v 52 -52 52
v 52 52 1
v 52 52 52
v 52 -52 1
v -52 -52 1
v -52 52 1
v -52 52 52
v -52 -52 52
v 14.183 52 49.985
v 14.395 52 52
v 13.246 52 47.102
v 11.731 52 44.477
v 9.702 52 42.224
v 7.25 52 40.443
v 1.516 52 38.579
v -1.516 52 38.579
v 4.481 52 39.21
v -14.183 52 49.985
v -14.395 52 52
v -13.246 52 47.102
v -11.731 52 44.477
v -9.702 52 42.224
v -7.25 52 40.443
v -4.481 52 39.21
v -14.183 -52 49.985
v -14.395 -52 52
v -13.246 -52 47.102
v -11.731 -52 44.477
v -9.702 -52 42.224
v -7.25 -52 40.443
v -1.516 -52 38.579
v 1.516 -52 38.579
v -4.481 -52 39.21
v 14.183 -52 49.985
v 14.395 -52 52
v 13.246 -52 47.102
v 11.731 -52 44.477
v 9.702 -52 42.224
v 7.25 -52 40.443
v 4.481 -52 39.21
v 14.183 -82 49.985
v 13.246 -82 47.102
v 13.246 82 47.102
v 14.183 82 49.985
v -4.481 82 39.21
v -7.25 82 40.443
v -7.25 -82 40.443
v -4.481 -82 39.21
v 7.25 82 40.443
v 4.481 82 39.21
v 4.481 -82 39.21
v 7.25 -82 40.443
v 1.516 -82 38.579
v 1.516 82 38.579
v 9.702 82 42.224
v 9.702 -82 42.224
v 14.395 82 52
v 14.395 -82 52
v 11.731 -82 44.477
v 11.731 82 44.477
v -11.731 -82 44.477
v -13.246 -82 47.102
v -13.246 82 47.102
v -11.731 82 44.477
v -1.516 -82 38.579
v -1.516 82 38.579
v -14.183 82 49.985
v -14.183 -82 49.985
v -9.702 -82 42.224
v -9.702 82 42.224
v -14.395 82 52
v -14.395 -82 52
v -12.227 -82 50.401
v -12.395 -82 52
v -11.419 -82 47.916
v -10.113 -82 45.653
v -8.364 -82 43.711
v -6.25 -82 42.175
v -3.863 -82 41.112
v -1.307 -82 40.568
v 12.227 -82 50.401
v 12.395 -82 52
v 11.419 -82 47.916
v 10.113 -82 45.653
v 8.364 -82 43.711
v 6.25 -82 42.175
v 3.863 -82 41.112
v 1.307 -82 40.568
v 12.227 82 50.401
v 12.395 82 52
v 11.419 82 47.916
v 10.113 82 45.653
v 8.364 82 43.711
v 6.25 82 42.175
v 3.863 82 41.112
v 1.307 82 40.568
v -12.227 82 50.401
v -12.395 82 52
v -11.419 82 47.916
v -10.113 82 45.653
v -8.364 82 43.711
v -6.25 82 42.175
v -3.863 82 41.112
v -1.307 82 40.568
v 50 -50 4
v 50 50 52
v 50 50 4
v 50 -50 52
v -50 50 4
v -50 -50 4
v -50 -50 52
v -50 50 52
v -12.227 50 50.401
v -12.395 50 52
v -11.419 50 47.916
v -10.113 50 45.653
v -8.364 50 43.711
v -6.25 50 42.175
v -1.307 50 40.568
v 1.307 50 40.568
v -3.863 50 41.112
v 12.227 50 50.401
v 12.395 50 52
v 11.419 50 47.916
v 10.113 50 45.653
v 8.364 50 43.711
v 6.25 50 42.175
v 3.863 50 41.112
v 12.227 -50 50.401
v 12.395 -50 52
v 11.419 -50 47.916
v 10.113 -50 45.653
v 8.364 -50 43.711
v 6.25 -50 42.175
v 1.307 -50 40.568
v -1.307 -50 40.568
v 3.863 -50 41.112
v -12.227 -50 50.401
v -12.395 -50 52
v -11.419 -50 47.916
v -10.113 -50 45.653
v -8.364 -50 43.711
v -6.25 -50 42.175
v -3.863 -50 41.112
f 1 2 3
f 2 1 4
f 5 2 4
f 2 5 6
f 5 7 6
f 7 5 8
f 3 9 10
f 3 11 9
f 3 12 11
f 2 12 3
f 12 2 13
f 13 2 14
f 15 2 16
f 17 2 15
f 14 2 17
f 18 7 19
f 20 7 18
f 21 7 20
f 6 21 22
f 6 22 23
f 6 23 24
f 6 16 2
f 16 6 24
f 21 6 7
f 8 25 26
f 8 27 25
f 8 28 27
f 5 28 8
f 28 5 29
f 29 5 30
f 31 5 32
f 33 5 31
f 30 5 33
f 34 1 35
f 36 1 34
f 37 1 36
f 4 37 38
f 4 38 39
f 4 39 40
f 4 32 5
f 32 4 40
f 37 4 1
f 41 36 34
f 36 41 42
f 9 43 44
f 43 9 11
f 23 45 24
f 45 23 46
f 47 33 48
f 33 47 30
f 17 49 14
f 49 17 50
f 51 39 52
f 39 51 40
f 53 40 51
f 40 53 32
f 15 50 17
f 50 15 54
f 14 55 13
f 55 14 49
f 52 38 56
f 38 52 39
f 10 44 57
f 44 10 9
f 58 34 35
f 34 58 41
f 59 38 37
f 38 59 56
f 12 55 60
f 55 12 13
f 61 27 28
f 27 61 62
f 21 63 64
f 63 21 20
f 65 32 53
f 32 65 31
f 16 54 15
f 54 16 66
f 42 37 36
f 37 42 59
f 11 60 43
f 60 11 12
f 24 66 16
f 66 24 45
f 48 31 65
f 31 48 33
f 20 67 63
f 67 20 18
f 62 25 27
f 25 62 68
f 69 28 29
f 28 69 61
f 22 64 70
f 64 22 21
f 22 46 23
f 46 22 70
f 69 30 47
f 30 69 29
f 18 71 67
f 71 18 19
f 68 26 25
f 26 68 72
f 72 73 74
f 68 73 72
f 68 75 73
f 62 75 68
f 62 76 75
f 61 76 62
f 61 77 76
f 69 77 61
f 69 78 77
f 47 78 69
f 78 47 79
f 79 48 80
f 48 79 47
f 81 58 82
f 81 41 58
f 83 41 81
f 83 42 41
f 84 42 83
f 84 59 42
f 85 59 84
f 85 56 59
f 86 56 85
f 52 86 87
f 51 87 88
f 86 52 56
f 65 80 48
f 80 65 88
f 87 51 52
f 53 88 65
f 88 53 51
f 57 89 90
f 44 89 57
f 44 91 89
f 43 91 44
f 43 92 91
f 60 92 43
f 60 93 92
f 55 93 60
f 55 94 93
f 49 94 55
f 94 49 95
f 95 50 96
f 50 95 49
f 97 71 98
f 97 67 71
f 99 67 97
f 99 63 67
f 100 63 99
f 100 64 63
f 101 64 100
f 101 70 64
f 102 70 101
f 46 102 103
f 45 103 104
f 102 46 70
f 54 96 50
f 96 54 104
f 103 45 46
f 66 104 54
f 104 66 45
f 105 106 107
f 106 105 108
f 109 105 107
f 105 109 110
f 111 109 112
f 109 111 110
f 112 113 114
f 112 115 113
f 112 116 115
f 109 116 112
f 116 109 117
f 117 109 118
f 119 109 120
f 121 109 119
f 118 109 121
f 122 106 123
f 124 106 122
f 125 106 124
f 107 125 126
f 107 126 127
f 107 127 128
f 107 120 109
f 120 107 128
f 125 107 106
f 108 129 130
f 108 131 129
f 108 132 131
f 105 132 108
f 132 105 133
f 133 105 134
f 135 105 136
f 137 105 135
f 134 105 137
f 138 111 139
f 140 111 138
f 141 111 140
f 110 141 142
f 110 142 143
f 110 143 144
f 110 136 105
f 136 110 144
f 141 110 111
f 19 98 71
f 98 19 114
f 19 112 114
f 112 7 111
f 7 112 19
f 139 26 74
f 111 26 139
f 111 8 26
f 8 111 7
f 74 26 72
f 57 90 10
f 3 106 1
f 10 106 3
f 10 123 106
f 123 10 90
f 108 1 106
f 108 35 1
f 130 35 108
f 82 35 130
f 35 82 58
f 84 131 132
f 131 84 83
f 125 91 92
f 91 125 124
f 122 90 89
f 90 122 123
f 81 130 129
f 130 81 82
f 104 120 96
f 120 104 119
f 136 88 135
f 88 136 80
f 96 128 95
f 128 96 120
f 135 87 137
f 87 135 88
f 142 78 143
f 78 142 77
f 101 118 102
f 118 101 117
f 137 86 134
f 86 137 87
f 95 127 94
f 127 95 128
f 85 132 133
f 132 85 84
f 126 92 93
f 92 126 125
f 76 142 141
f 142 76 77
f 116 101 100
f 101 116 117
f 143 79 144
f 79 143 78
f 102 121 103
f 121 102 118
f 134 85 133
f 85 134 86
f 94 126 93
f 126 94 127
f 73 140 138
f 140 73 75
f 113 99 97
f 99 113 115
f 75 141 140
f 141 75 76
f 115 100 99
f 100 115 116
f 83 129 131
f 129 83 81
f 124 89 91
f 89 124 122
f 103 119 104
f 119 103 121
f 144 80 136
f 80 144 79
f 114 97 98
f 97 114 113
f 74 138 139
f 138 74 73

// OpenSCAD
h_width = 100; // doboz szélessége
h_depth = 100; // doboz mélysége
h_height = 50; // doboz magassága
h_diameter = 25; // antenna cső átmérője
h_wall_thickness = 2; // falvastagság
h_fixture_width = 30; // rögzítő szélessége

translate([0, 0, (h_height / 2) + h_wall_thickness]) 
difference() {
  // doboz és rögzítő fala
  union() {
    cube([h_width + 2 * h_wall_thickness, h_depth + 2 * h_wall_thickness, h_height + h_wall_thickness], center = true);
    translate([0, 0, (h_height + h_wall_thickness) / 2]) 
    rotate([90, 0, 0])
    cylinder(h = h_width + h_fixture_width * 2 + h_wall_thickness * 2, r = h_diameter / 2 + h_wall_thickness, center = true);
  }

  // doboz belső terének törlése
  translate([0, 0, h_wall_thickness]) 
  cube([h_width, h_depth, h_height], center = true);
  
  // doboz feletti rész törlése
  translate([0, 0, h_height]) 
  cube([h_width * 2, h_depth * 2, h_height], center = true);

  // antenna cső helyének törlése
  translate([0, 0, (h_height + h_wall_thickness) / 2]) 
  rotate([90, 0, 0])
  cylinder(h = h_width + h_fixture_width * 3, r = h_diameter / 2, center = true);
}
